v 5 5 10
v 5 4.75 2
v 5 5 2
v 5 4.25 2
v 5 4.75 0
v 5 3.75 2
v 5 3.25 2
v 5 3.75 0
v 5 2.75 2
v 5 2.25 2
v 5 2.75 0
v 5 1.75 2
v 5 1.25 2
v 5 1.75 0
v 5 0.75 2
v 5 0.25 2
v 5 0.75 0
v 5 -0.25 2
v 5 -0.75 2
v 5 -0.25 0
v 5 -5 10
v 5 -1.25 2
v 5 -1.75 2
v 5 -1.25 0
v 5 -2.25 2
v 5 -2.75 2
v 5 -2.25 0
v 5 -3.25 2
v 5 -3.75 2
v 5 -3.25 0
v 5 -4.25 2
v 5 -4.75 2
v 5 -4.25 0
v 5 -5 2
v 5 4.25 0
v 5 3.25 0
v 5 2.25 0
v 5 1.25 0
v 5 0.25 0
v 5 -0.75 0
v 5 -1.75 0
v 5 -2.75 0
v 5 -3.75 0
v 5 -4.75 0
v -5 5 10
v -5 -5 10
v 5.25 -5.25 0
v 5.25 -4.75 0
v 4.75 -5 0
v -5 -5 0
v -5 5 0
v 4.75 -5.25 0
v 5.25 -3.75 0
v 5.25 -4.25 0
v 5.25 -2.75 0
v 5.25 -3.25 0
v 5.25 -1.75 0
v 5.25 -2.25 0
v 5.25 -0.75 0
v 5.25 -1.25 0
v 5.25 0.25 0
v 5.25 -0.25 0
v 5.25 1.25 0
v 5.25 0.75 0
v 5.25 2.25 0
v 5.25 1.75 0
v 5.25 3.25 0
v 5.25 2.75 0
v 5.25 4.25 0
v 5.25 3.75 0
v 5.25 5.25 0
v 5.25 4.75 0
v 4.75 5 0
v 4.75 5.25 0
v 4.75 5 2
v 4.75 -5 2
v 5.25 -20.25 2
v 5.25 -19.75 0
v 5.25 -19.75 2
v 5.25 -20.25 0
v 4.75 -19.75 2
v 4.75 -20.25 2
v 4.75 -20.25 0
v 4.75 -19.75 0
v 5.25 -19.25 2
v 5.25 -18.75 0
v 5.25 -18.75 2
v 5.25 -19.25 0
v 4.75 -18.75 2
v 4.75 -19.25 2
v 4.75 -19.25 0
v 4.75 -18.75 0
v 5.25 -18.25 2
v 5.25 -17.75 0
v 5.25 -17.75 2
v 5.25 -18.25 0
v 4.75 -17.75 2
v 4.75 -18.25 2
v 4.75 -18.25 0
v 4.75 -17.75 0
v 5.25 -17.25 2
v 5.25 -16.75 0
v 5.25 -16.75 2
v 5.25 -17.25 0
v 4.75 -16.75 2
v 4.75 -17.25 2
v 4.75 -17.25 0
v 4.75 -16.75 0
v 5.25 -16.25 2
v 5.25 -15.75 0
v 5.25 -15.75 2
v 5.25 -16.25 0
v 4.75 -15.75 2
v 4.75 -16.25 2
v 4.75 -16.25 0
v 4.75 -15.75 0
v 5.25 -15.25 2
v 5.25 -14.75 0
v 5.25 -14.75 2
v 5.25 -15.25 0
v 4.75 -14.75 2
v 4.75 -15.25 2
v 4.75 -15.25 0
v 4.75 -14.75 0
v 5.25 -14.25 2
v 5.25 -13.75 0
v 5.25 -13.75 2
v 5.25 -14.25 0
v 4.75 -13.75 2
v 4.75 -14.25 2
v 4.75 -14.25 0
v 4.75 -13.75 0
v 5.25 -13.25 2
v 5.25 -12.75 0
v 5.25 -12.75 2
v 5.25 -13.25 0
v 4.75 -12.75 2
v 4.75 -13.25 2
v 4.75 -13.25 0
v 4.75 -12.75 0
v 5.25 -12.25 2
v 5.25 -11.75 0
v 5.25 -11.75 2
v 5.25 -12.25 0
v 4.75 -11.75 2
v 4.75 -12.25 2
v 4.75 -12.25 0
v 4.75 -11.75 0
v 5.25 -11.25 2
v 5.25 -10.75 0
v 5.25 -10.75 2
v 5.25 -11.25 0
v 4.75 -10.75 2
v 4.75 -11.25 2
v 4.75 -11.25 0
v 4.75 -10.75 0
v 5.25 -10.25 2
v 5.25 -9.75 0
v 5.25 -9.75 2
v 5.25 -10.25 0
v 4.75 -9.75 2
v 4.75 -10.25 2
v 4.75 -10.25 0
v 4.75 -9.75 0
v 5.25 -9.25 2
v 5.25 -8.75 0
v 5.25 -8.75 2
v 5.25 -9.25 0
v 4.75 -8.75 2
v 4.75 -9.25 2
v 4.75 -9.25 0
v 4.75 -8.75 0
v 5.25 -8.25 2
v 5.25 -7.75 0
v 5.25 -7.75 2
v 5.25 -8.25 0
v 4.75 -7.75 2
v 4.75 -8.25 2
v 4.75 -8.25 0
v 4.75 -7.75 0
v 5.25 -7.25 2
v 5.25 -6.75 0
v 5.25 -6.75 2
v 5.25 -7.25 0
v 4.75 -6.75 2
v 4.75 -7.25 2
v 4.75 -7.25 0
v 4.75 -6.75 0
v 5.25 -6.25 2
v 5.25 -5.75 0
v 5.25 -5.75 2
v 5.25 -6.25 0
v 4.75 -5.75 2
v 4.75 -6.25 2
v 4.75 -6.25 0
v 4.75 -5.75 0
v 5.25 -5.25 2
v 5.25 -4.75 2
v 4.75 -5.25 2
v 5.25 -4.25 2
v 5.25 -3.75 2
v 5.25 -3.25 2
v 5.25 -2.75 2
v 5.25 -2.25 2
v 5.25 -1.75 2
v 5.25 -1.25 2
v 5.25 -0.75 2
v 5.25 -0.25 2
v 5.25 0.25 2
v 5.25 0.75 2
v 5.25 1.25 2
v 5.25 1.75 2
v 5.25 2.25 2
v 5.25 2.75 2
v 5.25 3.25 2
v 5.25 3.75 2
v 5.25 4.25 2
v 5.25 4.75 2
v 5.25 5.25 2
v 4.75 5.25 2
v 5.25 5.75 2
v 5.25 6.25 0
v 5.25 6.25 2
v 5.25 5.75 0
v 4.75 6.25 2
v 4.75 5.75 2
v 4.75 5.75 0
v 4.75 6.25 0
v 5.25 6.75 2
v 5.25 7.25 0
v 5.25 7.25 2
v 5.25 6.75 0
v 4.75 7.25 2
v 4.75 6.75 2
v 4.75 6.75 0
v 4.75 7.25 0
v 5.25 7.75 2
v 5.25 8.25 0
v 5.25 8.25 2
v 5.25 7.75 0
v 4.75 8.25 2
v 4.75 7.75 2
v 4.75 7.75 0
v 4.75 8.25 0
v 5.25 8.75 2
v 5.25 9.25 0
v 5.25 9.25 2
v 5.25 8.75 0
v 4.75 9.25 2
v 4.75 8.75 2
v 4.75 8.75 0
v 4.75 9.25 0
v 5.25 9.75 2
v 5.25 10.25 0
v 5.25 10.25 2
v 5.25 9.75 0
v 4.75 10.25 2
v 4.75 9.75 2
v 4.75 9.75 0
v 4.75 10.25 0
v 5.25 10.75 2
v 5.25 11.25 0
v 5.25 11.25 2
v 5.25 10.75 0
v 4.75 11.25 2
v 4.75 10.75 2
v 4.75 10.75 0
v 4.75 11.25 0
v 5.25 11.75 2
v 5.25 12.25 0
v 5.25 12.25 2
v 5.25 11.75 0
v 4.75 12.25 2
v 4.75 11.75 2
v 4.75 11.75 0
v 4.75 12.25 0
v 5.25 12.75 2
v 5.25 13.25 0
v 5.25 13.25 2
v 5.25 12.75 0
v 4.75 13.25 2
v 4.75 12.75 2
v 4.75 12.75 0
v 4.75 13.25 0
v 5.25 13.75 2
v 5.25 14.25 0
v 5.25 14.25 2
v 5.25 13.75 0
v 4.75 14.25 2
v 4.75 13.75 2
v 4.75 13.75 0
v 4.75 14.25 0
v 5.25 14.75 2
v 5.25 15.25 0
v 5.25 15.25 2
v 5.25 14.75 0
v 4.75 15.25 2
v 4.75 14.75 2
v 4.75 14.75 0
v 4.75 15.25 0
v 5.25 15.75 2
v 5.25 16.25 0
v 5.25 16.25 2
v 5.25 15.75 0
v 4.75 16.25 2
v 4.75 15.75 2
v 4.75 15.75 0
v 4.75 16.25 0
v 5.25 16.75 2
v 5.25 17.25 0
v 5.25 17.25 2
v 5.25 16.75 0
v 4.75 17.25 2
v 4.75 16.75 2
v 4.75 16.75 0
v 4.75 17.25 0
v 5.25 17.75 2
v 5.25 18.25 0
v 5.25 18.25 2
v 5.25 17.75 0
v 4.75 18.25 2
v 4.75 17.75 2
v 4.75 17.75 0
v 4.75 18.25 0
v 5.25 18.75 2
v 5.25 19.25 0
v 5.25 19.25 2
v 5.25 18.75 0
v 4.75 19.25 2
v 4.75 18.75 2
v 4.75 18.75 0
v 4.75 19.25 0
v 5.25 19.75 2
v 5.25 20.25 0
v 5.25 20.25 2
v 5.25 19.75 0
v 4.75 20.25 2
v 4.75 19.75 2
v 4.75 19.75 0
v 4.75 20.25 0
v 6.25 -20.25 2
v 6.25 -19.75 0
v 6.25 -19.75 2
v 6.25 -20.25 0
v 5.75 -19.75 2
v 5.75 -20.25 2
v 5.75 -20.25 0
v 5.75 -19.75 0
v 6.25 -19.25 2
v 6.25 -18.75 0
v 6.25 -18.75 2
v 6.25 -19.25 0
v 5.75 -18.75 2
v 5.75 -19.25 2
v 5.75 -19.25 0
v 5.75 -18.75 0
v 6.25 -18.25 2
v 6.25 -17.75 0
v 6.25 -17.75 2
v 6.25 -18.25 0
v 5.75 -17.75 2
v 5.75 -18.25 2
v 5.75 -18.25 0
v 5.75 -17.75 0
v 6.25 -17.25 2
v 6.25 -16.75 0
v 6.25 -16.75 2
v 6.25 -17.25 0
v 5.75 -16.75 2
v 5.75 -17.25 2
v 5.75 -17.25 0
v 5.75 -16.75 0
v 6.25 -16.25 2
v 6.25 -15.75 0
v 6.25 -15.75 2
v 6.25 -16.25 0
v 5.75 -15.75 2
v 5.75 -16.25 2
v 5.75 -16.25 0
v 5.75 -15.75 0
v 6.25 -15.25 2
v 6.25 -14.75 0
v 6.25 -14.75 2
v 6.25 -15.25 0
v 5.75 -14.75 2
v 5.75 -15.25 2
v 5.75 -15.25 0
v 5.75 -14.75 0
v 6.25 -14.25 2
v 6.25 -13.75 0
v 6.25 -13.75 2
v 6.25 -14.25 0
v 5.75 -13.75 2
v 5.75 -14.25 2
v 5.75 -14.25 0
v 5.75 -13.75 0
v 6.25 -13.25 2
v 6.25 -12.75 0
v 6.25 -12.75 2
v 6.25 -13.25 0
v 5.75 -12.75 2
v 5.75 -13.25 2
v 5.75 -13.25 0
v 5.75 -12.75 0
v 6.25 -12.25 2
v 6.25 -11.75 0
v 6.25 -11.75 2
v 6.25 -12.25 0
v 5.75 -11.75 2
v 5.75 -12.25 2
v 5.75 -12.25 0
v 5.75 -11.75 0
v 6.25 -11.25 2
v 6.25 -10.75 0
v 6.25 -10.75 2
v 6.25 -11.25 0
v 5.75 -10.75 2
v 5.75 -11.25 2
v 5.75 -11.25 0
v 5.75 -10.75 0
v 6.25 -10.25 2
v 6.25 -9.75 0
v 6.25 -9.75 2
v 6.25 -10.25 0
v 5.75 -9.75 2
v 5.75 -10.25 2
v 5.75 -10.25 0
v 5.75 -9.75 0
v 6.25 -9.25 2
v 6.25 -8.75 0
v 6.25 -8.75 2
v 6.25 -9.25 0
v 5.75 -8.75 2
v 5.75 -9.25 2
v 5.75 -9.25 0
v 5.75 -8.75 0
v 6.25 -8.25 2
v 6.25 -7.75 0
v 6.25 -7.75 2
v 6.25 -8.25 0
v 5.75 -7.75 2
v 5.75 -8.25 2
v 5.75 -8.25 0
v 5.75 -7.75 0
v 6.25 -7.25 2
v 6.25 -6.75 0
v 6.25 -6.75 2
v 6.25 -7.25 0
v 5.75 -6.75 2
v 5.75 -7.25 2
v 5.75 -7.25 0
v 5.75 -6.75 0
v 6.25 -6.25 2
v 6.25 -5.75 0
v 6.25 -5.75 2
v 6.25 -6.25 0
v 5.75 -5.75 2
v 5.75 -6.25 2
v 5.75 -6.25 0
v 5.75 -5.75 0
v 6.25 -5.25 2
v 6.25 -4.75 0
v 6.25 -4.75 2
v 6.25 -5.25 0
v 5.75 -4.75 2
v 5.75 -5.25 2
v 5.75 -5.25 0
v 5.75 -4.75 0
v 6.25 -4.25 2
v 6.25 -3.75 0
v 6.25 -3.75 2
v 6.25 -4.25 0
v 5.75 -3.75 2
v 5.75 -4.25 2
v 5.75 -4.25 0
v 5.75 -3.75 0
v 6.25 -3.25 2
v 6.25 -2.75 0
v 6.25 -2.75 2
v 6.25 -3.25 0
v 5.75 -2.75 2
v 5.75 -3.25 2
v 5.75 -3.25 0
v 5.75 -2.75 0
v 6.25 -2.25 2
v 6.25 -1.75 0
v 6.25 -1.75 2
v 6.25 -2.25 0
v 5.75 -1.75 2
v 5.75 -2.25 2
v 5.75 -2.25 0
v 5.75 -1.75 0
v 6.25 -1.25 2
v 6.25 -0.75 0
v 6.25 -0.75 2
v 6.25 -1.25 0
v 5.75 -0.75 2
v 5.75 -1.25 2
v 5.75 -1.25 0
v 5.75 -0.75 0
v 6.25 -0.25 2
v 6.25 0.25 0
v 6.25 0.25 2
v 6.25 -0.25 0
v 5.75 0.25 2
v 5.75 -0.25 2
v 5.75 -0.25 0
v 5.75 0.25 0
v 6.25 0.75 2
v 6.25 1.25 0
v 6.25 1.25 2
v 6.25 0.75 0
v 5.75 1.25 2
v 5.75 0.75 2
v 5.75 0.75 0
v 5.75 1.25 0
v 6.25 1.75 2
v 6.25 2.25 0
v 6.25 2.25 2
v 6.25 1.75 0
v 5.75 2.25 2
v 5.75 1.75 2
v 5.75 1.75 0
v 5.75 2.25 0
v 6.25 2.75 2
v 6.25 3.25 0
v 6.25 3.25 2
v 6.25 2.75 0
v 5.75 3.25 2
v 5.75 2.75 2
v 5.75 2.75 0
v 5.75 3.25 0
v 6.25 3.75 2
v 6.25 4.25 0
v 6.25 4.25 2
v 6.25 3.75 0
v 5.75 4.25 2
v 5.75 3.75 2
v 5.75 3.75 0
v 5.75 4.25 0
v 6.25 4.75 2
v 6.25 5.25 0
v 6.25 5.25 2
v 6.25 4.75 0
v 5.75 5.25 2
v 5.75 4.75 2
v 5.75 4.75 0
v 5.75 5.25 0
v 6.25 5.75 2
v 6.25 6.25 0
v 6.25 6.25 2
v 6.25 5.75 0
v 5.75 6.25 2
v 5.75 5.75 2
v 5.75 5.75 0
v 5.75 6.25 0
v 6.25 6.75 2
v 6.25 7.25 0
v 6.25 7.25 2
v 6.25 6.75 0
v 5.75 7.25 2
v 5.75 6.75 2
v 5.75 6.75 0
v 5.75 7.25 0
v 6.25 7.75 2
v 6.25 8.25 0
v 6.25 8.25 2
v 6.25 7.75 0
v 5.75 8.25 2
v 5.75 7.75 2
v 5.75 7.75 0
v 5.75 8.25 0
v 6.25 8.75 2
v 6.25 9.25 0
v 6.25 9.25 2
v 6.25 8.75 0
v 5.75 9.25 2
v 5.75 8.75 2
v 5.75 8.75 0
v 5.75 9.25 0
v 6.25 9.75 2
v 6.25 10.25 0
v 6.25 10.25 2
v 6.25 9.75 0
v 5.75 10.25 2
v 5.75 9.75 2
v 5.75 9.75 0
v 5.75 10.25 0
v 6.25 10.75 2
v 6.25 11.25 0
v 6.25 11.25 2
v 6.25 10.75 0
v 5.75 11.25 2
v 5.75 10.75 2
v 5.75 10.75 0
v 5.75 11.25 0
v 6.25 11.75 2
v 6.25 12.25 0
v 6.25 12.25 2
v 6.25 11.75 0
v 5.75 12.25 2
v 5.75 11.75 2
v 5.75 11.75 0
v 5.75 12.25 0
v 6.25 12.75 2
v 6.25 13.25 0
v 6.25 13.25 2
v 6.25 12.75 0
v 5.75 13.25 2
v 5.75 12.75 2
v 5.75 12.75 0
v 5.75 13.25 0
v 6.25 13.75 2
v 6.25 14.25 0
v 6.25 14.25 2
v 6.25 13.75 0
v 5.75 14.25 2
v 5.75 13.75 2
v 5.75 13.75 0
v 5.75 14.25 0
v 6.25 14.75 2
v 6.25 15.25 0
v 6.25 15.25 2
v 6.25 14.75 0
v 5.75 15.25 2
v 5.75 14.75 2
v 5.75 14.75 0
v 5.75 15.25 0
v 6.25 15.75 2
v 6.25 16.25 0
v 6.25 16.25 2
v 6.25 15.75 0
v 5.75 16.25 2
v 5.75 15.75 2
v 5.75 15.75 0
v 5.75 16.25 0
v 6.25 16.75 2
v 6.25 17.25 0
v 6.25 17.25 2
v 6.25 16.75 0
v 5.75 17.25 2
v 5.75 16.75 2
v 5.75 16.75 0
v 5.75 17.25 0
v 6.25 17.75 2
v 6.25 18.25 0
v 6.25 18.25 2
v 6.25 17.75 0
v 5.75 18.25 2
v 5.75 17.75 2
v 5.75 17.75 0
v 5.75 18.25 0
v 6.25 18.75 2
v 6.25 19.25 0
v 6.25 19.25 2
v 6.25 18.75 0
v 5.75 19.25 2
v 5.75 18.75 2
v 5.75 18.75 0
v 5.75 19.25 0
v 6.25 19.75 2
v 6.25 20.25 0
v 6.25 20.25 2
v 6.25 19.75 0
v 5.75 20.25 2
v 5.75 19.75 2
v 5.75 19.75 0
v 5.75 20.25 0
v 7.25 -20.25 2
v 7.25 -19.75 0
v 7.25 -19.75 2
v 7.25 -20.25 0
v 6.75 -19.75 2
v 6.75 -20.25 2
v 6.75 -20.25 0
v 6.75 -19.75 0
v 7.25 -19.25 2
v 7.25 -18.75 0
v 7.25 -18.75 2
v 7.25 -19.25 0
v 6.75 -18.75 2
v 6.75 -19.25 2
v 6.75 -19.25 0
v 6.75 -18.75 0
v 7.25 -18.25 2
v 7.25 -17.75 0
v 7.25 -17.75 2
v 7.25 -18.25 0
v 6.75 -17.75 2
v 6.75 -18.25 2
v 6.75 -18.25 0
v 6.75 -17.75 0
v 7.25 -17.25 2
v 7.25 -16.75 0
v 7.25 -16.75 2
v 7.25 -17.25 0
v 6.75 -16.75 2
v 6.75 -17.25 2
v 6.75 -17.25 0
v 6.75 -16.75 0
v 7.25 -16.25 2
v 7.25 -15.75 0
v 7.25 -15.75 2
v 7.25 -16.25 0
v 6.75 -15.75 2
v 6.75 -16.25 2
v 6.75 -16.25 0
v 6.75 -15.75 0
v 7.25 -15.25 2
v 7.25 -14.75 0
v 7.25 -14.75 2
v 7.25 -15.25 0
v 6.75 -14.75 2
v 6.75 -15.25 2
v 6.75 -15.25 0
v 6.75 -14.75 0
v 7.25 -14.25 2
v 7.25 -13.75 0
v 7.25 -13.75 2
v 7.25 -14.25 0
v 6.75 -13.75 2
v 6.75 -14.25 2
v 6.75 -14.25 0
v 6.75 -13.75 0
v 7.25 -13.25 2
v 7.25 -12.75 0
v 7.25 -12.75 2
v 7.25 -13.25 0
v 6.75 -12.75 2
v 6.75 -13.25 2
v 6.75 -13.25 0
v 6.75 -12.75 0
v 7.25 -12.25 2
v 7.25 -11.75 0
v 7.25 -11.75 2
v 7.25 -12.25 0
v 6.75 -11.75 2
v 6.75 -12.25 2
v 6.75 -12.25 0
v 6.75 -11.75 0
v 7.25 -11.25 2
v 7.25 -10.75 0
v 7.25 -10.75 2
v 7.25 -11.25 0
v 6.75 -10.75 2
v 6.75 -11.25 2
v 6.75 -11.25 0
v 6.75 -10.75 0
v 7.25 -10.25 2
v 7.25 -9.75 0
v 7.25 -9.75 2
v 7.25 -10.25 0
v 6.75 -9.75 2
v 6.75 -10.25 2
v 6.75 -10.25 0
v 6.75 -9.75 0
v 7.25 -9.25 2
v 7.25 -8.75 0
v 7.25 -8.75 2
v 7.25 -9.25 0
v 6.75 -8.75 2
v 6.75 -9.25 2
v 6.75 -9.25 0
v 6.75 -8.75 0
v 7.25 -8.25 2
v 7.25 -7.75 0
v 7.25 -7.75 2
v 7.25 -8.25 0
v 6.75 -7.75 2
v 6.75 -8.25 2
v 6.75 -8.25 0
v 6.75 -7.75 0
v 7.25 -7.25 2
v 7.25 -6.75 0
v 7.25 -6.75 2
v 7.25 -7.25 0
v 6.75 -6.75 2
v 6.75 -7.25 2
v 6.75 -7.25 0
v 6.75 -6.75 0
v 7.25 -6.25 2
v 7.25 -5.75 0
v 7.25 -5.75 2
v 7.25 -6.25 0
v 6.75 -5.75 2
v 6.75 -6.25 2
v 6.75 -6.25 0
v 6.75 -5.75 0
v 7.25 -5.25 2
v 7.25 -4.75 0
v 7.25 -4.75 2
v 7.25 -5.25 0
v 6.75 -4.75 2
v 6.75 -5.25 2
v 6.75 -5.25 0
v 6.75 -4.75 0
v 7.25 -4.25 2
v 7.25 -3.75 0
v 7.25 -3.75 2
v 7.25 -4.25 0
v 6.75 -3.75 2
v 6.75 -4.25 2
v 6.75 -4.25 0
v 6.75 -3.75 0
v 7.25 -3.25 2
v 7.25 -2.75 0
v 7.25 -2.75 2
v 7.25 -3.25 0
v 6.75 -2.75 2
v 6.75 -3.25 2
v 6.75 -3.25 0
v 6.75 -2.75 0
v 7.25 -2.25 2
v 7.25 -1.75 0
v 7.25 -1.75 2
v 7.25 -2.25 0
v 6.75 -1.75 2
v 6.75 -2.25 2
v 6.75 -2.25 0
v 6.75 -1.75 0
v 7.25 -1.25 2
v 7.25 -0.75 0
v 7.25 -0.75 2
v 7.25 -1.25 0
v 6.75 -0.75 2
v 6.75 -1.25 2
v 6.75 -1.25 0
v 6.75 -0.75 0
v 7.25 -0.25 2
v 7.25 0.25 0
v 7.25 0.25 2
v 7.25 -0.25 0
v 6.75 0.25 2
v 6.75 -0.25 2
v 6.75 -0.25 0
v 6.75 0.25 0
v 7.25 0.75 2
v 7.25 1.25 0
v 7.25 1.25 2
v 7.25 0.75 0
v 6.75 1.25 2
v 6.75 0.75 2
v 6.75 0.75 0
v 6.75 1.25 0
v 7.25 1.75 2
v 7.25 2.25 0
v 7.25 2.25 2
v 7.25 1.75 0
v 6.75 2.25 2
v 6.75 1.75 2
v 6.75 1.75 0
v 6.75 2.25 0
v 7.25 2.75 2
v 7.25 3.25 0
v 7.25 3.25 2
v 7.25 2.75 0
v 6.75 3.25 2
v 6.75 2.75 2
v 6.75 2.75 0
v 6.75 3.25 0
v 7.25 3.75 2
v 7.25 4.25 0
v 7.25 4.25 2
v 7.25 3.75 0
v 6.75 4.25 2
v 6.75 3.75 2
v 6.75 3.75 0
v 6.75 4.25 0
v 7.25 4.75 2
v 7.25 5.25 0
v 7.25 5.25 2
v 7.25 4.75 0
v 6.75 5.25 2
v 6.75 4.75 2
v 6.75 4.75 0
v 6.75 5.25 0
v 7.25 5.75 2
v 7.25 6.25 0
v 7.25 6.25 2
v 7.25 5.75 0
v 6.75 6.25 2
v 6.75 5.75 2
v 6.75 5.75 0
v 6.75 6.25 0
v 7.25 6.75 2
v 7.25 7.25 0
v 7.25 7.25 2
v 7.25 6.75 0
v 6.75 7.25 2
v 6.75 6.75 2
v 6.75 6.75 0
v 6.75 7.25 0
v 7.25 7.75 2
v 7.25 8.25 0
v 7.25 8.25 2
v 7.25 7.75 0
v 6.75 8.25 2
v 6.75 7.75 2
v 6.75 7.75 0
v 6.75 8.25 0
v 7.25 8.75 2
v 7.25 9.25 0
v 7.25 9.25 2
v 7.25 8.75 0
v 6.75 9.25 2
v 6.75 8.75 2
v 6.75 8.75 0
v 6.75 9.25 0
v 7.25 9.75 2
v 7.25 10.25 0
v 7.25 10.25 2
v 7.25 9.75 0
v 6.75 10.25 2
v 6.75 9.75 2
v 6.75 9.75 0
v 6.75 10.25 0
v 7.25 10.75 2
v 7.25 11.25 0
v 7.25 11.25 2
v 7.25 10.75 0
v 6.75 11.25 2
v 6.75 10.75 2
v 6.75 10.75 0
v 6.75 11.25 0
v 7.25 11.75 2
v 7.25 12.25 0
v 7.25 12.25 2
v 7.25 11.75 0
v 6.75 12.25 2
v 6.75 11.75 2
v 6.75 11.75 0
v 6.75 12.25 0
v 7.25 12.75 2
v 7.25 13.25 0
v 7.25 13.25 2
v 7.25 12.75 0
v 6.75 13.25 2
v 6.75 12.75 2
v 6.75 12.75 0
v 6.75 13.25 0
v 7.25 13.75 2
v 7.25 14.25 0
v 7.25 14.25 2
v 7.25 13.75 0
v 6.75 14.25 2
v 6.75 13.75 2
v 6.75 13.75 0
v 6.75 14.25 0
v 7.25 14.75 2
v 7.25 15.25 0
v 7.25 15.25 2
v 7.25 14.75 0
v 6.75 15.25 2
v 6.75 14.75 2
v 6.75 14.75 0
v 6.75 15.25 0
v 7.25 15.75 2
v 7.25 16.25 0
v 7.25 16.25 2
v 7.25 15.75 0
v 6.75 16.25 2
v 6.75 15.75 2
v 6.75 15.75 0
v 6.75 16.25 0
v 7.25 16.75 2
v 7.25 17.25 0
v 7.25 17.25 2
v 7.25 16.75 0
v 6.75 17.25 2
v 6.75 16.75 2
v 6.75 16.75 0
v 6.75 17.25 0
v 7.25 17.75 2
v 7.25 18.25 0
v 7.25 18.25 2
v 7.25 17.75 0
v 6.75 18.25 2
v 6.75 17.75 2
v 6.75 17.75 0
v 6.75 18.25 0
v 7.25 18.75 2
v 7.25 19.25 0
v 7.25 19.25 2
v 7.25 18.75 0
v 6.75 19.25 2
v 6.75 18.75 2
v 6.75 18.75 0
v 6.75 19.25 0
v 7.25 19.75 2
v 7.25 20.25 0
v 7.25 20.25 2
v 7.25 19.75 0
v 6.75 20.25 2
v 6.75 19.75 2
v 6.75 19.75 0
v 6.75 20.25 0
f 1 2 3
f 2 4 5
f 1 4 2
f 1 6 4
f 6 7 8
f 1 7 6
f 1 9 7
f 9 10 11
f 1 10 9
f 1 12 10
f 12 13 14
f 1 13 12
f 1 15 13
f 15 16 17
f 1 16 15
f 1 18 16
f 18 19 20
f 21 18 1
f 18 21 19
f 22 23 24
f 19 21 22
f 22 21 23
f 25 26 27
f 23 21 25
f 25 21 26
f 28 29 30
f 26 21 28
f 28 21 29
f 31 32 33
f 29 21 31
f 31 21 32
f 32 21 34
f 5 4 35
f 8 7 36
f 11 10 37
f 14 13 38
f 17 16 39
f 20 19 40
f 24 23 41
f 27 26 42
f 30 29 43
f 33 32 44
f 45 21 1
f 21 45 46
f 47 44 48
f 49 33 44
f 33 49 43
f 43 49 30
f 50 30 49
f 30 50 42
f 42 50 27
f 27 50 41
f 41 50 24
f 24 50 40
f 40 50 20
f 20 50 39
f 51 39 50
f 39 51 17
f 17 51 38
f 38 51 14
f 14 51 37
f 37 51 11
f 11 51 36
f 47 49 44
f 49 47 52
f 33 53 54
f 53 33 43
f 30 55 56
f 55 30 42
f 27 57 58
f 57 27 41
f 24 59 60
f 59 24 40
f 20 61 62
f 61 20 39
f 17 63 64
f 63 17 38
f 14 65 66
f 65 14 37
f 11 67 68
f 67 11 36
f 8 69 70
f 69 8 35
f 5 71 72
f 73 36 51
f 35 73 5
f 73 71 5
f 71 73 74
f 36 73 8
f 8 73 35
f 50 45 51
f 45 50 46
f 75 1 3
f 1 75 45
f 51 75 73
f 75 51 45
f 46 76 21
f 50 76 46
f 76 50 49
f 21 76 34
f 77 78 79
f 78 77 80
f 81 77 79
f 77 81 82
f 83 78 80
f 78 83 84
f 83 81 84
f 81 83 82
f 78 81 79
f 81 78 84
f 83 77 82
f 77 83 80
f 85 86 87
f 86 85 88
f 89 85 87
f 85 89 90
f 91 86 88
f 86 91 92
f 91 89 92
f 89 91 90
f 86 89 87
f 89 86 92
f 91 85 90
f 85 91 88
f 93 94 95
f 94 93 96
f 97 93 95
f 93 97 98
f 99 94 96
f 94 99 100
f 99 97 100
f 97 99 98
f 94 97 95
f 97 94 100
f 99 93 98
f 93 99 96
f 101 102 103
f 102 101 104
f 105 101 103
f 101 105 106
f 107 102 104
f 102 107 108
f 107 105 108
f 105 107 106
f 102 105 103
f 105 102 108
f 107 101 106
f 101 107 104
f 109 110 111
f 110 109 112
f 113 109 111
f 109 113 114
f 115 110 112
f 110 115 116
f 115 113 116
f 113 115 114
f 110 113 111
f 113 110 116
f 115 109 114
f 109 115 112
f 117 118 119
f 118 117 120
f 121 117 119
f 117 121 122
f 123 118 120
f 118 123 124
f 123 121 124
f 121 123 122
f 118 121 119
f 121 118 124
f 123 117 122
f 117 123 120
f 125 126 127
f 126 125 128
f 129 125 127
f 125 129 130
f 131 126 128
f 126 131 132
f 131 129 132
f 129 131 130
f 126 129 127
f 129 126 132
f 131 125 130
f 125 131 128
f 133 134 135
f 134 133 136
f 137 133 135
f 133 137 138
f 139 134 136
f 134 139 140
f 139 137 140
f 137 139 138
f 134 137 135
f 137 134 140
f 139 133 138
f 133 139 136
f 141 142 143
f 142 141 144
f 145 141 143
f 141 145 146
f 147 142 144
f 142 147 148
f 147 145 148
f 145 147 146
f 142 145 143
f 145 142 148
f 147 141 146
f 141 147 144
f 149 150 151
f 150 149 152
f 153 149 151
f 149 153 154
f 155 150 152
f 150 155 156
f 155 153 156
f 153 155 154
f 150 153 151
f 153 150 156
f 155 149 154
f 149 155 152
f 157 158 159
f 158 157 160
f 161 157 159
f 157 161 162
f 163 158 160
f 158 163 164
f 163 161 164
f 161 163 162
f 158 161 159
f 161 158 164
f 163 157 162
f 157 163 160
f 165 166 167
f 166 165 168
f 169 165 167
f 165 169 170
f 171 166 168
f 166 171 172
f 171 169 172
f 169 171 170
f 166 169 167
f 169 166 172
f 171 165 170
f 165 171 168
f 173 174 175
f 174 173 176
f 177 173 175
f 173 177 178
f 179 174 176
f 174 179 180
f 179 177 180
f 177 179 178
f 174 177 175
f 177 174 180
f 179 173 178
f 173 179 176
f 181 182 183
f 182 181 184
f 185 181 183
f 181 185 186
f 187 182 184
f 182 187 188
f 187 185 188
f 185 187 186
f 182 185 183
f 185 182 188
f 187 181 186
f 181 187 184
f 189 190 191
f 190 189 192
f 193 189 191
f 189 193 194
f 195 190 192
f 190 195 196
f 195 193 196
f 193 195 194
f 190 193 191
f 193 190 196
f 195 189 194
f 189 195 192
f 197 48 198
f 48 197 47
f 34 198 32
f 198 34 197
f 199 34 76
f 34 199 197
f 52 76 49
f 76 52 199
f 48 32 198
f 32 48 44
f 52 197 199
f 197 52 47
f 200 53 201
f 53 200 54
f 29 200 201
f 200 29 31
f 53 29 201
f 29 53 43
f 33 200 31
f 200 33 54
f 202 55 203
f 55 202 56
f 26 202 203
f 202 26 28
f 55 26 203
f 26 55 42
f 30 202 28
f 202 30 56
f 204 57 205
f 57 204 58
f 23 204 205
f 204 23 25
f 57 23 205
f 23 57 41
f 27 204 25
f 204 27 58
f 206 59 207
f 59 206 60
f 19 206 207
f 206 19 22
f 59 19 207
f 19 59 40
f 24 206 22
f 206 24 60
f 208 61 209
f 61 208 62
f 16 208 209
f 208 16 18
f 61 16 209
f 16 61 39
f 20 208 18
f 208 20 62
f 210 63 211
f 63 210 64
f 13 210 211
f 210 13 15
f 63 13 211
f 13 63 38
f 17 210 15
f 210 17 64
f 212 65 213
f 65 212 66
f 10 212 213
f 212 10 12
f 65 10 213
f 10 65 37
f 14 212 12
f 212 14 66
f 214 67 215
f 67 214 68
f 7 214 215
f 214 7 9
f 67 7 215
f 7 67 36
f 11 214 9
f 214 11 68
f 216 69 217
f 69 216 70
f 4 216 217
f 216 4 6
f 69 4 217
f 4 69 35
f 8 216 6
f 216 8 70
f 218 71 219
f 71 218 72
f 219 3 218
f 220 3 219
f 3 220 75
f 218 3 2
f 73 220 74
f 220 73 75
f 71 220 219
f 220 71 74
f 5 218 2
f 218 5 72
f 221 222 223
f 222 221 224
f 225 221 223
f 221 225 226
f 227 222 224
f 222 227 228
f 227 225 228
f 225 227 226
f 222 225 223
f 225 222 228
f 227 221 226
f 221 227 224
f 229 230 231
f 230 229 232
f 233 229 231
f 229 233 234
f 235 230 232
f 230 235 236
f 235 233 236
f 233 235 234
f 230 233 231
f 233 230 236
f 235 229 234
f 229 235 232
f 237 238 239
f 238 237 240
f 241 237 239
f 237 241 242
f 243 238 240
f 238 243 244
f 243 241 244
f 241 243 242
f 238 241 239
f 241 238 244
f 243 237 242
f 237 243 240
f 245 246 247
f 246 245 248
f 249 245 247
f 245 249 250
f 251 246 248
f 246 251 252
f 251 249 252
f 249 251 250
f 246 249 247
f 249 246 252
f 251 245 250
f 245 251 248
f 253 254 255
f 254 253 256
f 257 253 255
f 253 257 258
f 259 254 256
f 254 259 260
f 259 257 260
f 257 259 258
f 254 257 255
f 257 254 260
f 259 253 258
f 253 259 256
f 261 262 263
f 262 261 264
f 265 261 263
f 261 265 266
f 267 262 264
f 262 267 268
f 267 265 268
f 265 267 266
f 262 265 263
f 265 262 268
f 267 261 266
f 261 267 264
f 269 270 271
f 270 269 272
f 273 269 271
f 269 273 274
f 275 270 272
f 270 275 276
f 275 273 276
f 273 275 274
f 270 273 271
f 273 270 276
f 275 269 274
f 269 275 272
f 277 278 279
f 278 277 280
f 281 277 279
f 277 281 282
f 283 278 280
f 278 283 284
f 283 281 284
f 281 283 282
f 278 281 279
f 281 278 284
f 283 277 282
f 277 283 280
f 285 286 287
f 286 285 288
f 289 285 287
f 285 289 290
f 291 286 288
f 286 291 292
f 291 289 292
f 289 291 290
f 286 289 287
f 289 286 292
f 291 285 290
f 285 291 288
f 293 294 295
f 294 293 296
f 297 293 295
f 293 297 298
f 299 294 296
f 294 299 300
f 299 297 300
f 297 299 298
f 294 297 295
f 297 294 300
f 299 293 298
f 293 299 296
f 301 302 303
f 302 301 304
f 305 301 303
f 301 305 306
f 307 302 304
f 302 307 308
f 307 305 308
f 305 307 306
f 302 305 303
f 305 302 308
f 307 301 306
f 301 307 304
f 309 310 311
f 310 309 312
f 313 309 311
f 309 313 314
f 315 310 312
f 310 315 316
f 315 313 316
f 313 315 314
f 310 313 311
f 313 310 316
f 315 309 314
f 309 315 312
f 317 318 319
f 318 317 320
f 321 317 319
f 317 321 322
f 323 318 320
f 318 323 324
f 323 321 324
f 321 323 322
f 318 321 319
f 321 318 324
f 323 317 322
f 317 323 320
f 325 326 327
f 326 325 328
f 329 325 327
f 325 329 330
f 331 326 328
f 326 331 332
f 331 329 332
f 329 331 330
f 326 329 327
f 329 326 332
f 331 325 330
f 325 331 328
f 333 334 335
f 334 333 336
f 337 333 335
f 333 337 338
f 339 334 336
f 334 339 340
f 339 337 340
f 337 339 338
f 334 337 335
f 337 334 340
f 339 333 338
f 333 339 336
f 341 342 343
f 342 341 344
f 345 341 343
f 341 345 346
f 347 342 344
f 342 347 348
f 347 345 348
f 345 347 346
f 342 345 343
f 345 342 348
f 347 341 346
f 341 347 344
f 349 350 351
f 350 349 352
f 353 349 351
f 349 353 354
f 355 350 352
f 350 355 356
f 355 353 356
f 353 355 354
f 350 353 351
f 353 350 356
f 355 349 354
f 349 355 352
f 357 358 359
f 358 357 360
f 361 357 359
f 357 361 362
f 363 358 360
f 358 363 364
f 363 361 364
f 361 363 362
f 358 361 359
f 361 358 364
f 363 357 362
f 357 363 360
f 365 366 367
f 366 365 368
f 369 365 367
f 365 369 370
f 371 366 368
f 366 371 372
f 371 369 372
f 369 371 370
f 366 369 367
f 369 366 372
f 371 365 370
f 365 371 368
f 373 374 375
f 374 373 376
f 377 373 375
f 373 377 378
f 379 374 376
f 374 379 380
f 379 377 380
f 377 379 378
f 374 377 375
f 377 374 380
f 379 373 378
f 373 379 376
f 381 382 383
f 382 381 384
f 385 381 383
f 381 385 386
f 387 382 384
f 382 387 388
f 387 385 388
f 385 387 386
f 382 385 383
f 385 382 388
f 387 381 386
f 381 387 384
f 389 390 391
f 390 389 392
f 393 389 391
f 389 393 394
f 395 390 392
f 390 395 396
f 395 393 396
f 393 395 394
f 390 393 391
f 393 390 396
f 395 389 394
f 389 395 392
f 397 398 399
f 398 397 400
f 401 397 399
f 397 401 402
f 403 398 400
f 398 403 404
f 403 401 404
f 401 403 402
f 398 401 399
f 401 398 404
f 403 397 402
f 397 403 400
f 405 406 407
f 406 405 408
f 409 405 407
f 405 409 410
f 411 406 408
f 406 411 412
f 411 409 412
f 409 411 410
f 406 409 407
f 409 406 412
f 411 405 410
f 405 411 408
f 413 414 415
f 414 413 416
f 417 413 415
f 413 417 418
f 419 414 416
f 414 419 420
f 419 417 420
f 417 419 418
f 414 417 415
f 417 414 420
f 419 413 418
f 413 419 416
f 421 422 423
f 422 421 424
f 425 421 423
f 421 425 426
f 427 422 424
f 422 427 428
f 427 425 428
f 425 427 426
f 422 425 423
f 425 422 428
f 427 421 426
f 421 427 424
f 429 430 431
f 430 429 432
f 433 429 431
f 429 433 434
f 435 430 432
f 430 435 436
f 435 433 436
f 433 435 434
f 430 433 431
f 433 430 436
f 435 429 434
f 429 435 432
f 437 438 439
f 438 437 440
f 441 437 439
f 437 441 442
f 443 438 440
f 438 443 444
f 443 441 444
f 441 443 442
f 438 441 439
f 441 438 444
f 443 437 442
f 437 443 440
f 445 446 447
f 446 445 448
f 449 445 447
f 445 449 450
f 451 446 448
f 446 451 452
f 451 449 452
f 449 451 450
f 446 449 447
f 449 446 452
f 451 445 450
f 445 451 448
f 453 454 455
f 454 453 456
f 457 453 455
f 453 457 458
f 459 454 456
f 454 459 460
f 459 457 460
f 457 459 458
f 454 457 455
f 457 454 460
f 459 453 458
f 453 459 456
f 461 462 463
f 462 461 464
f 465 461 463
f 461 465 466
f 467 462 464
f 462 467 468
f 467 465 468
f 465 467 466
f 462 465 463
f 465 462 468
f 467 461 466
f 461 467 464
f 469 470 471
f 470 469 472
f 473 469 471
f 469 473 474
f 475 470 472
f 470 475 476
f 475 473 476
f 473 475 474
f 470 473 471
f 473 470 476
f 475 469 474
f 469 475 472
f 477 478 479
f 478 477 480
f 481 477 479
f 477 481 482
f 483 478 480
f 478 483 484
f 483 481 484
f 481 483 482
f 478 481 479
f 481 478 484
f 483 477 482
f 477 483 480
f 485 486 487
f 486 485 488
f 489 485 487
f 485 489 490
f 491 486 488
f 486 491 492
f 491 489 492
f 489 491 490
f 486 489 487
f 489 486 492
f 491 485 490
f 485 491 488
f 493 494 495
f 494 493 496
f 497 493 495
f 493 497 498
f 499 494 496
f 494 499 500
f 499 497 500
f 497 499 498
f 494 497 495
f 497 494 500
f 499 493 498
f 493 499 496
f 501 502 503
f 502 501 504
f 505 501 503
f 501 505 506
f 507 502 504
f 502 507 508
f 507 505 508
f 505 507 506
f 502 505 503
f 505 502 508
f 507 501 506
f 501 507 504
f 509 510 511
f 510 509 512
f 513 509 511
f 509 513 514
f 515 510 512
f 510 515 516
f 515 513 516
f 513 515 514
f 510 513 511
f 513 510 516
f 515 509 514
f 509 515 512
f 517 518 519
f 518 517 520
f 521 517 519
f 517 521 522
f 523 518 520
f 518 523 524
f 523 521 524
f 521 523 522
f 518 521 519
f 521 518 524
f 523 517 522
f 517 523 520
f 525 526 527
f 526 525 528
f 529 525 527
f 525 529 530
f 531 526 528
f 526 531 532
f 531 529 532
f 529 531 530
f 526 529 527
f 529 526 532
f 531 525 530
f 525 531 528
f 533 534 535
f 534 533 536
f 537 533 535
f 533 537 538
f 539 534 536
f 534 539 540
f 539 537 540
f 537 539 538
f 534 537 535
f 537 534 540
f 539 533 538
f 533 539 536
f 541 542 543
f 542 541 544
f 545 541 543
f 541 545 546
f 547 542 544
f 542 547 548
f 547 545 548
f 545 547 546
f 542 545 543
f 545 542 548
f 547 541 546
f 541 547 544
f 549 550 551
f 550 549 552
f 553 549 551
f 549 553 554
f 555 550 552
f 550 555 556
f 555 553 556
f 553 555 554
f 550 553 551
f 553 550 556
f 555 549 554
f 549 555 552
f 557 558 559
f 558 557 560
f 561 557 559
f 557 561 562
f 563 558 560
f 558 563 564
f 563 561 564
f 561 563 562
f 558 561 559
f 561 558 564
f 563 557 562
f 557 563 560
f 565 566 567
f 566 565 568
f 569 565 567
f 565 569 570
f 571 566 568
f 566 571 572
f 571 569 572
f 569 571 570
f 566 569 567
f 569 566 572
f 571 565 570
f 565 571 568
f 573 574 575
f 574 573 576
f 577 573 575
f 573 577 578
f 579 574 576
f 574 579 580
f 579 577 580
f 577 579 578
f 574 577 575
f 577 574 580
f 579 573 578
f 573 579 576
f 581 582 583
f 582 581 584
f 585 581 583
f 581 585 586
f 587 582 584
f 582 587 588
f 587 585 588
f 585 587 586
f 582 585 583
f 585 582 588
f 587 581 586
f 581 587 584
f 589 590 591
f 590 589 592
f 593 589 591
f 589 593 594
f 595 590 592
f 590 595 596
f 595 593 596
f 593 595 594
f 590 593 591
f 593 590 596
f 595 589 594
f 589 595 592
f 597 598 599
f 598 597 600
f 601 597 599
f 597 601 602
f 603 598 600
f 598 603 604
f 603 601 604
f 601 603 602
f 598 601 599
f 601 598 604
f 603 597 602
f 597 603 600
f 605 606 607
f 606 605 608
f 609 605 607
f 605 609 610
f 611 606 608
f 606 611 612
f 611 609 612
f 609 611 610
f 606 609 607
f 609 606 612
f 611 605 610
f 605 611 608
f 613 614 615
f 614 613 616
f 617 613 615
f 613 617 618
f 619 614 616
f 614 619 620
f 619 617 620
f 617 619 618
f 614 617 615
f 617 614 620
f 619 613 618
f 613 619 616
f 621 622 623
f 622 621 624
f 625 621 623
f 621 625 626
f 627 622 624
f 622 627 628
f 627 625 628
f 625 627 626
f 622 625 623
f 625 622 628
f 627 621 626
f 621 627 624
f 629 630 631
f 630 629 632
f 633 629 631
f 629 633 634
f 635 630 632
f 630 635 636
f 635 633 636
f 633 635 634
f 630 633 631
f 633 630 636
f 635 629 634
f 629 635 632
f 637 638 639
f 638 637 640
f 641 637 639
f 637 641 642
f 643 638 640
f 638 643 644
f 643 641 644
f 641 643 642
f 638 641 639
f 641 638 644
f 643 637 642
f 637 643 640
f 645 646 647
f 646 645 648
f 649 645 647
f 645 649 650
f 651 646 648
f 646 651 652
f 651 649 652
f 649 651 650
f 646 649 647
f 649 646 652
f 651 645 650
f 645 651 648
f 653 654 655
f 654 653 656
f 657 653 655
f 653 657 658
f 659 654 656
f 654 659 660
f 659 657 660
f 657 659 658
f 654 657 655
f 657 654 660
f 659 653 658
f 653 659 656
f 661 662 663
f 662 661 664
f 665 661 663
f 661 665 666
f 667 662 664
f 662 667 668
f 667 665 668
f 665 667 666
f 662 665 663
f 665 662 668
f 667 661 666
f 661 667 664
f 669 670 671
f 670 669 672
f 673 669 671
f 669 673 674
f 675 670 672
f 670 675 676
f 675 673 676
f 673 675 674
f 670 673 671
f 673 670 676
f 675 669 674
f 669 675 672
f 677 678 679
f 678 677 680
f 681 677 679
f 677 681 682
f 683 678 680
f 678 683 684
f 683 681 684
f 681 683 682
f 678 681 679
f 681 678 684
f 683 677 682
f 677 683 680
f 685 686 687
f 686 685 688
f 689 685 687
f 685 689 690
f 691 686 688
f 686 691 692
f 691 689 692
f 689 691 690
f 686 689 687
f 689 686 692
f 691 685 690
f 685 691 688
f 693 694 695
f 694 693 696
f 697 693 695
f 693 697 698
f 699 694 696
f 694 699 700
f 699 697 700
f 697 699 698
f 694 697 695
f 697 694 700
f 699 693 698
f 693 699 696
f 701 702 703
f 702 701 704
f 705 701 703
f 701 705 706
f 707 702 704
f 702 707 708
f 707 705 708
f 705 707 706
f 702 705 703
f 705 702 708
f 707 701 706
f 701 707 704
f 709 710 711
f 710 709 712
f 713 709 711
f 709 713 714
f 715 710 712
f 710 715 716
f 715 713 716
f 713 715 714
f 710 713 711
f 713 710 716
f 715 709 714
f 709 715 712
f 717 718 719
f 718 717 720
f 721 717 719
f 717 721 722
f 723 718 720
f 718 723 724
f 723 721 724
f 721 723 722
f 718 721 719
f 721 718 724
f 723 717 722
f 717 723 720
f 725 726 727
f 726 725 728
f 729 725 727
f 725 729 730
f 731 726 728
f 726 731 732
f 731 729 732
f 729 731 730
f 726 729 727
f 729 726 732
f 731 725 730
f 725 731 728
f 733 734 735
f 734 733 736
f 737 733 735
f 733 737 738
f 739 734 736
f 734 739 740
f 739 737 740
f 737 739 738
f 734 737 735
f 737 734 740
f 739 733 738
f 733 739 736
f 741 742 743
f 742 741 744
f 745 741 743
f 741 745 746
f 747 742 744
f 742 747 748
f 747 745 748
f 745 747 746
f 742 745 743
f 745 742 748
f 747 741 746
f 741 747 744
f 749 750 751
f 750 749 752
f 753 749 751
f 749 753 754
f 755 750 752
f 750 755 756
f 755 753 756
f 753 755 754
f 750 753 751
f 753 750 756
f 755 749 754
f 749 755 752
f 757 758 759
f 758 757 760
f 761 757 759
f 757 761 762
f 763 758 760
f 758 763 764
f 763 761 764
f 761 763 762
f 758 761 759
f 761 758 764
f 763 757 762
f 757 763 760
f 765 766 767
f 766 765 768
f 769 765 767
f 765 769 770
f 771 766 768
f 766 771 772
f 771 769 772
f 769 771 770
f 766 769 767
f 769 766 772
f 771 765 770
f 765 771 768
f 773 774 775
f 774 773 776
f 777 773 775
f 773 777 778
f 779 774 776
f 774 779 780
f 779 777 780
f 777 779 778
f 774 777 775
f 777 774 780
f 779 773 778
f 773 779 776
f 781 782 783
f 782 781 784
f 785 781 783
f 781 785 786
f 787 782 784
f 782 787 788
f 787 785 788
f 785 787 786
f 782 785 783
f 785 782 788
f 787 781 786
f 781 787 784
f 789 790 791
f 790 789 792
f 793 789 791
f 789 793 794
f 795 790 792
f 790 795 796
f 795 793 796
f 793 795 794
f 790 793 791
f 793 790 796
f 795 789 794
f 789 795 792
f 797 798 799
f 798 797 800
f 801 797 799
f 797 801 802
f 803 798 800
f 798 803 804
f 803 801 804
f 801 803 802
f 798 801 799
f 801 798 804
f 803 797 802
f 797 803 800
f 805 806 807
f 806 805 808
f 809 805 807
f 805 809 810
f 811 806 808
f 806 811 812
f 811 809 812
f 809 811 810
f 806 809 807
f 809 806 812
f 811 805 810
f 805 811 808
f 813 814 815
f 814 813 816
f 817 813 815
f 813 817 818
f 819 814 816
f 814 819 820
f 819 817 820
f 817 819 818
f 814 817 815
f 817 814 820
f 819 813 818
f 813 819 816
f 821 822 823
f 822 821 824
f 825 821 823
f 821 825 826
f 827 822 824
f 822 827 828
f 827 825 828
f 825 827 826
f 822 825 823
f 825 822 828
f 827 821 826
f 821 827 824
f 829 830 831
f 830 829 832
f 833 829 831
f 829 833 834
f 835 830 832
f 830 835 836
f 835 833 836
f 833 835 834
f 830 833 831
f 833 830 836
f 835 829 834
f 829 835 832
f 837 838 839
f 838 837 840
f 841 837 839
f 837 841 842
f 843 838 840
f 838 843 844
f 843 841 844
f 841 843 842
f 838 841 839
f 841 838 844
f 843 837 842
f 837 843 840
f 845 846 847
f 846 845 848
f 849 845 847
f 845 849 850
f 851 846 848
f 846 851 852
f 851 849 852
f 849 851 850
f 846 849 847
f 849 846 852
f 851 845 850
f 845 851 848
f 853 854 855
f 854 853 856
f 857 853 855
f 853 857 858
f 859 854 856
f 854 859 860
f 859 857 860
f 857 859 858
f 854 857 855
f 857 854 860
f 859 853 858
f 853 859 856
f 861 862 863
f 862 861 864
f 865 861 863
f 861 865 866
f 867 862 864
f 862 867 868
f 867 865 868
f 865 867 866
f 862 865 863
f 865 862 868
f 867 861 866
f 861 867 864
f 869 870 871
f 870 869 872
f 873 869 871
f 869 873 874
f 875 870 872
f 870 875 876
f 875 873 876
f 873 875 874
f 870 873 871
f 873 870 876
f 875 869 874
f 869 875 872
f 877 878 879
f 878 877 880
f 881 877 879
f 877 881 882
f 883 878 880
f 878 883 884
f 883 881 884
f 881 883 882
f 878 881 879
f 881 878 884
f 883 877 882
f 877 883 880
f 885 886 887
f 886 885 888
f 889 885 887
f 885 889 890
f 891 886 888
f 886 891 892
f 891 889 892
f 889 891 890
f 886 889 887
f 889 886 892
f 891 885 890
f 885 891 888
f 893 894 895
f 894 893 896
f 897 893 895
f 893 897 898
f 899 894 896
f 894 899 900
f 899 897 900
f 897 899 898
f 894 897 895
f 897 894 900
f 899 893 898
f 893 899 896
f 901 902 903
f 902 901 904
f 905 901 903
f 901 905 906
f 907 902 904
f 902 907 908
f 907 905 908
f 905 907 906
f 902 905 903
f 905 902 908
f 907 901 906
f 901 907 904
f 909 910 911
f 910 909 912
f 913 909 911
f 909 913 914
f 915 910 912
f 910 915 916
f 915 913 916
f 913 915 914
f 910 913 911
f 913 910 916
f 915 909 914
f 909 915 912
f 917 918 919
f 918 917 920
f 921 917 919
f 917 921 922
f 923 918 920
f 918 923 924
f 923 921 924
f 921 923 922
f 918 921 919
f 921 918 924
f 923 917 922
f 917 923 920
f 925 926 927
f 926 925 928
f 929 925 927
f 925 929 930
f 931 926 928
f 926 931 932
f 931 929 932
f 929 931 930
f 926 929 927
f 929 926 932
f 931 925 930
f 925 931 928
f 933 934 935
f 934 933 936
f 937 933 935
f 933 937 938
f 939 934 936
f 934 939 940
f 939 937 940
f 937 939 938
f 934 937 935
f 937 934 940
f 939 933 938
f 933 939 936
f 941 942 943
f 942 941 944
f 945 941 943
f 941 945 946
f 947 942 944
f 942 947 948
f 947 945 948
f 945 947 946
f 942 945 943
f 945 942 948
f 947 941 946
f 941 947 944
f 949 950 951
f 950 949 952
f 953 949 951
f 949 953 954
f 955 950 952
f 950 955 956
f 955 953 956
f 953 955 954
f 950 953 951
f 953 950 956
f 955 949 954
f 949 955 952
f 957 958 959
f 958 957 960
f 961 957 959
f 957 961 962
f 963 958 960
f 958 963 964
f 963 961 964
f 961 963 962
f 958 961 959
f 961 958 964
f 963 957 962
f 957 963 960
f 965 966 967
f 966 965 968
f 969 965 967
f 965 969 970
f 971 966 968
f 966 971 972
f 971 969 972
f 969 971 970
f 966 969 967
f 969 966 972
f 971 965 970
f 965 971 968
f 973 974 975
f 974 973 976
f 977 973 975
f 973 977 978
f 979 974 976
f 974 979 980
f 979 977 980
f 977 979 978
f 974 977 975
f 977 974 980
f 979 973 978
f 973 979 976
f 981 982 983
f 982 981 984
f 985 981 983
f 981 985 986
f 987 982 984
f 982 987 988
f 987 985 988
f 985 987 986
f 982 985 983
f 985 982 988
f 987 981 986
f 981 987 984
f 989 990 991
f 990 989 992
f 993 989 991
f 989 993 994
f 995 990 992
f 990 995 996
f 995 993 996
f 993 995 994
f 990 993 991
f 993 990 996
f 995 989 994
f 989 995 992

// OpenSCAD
translate([0, 0, 5]) color([0,1,0,0.9]) cube([10, 10, 10], center=true);
translate([5.0, -20.0, 1]) color([1,0,0]) cube([0.5, 0.5, 2], center=true);
translate([5.0, -19.0, 1]) color([1,0,0]) cube([0.5, 0.5, 2], center=true);
translate([5.0, -18.0, 1]) color([1,0,0]) cube([0.5, 0.5, 2], center=true);
translate([5.0, -17.0, 1]) color([1,0,0]) cube([0.5, 0.5, 2], center=true);
translate([5.0, -16.0, 1]) color([1,0,0]) cube([0.5, 0.5, 2], center=true);
translate([5.0, -15.0, 1]) color([1,0,0]) cube([0.5, 0.5, 2], center=true);
translate([5.0, -14.0, 1]) color([1,0,0]) cube([0.5, 0.5, 2], center=true);
translate([5.0, -13.0, 1]) color([1,0,0]) cube([0.5, 0.5, 2], center=true);
translate([5.0, -12.0, 1]) color([1,0,0]) cube([0.5, 0.5, 2], center=true);
translate([5.0, -11.0, 1]) color([1,0,0]) cube([0.5, 0.5, 2], center=true);
translate([5.0, -10.0, 1]) color([1,0,0]) cube([0.5, 0.5, 2], center=true);
translate([5.0, -9.0, 1]) color([1,0,0]) cube([0.5, 0.5, 2], center=true);
translate([5.0, -8.0, 1]) color([1,0,0]) cube([0.5, 0.5, 2], center=true);
translate([5.0, -7.0, 1]) color([1,0,0]) cube([0.5, 0.5, 2], center=true);
translate([5.0, -6.0, 1]) color([1,0,0]) cube([0.5, 0.5, 2], center=true);
translate([5.0, -5.0, 1]) color([1,0,0]) cube([0.5, 0.5, 2], center=true);
translate([5.0, -4.0, 1]) color([1,0,0]) cube([0.5, 0.5, 2], center=true);
translate([5.0, -3.0, 1]) color([1,0,0]) cube([0.5, 0.5, 2], center=true);
translate([5.0, -2.0, 1]) color([1,0,0]) cube([0.5, 0.5, 2], center=true);
translate([5.0, -1.0, 1]) color([1,0,0]) cube([0.5, 0.5, 2], center=true);
translate([5.0, 0.0, 1]) color([1,0,0]) cube([0.5, 0.5, 2], center=true);
translate([5.0, 1.0, 1]) color([1,0,0]) cube([0.5, 0.5, 2], center=true);
translate([5.0, 2.0, 1]) color([1,0,0]) cube([0.5, 0.5, 2], center=true);
translate([5.0, 3.0, 1]) color([1,0,0]) cube([0.5, 0.5, 2], center=true);
translate([5.0, 4.0, 1]) color([1,0,0]) cube([0.5, 0.5, 2], center=true);
translate([5.0, 5.0, 1]) color([1,0,0]) cube([0.5, 0.5, 2], center=true);
translate([5.0, 6.0, 1]) color([1,0,0]) cube([0.5, 0.5, 2], center=true);
translate([5.0, 7.0, 1]) color([1,0,0]) cube([0.5, 0.5, 2], center=true);
translate([5.0, 8.0, 1]) color([1,0,0]) cube([0.5, 0.5, 2], center=true);
translate([5.0, 9.0, 1]) color([1,0,0]) cube([0.5, 0.5, 2], center=true);
translate([5.0, 10.0, 1]) color([1,0,0]) cube([0.5, 0.5, 2], center=true);
translate([5.0, 11.0, 1]) color([1,0,0]) cube([0.5, 0.5, 2], center=true);
translate([5.0, 12.0, 1]) color([1,0,0]) cube([0.5, 0.5, 2], center=true);
translate([5.0, 13.0, 1]) color([1,0,0]) cube([0.5, 0.5, 2], center=true);
translate([5.0, 14.0, 1]) color([1,0,0]) cube([0.5, 0.5, 2], center=true);
translate([5.0, 15.0, 1]) color([1,0,0]) cube([0.5, 0.5, 2], center=true);
translate([5.0, 16.0, 1]) color([1,0,0]) cube([0.5, 0.5, 2], center=true);
translate([5.0, 17.0, 1]) color([1,0,0]) cube([0.5, 0.5, 2], center=true);
translate([5.0, 18.0, 1]) color([1,0,0]) cube([0.5, 0.5, 2], center=true);
translate([5.0, 19.0, 1]) color([1,0,0]) cube([0.5, 0.5, 2], center=true);
translate([5.0, 20.0, 1]) color([1,0,0]) cube([0.5, 0.5, 2], center=true);
translate([6.0, -20.0, 1]) color([1,0,0]) cube([0.5, 0.5, 2], center=true);
translate([6.0, -19.0, 1]) color([1,0,0]) cube([0.5, 0.5, 2], center=true);
translate([6.0, -18.0, 1]) color([1,0,0]) cube([0.5, 0.5, 2], center=true);
translate([6.0, -17.0, 1]) color([1,0,0]) cube([0.5, 0.5, 2], center=true);
translate([6.0, -16.0, 1]) color([1,0,0]) cube([0.5, 0.5, 2], center=true);
translate([6.0, -15.0, 1]) color([1,0,0]) cube([0.5, 0.5, 2], center=true);
translate([6.0, -14.0, 1]) color([1,0,0]) cube([0.5, 0.5, 2], center=true);
translate([6.0, -13.0, 1]) color([1,0,0]) cube([0.5, 0.5, 2], center=true);
translate([6.0, -12.0, 1]) color([1,0,0]) cube([0.5, 0.5, 2], center=true);
translate([6.0, -11.0, 1]) color([1,0,0]) cube([0.5, 0.5, 2], center=true);
translate([6.0, -10.0, 1]) color([1,0,0]) cube([0.5, 0.5, 2], center=true);
translate([6.0, -9.0, 1]) color([1,0,0]) cube([0.5, 0.5, 2], center=true);
translate([6.0, -8.0, 1]) color([1,0,0]) cube([0.5, 0.5, 2], center=true);
translate([6.0, -7.0, 1]) color([1,0,0]) cube([0.5, 0.5, 2], center=true);
translate([6.0, -6.0, 1]) color([1,0,0]) cube([0.5, 0.5, 2], center=true);
translate([6.0, -5.0, 1]) color([1,0,0]) cube([0.5, 0.5, 2], center=true);
translate([6.0, -4.0, 1]) color([1,0,0]) cube([0.5, 0.5, 2], center=true);
translate([6.0, -3.0, 1]) color([1,0,0]) cube([0.5, 0.5, 2], center=true);
translate([6.0, -2.0, 1]) color([1,0,0]) cube([0.5, 0.5, 2], center=true);
translate([6.0, -1.0, 1]) color([1,0,0]) cube([0.5, 0.5, 2], center=true);
translate([6.0, 0.0, 1]) color([1,0,0]) cube([0.5, 0.5, 2], center=true);
translate([6.0, 1.0, 1]) color([1,0,0]) cube([0.5, 0.5, 2], center=true);
translate([6.0, 2.0, 1]) color([1,0,0]) cube([0.5, 0.5, 2], center=true);
translate([6.0, 3.0, 1]) color([1,0,0]) cube([0.5, 0.5, 2], center=true);
translate([6.0, 4.0, 1]) color([1,0,0]) cube([0.5, 0.5, 2], center=true);
translate([6.0, 5.0, 1]) color([1,0,0]) cube([0.5, 0.5, 2], center=true);
translate([6.0, 6.0, 1]) color([1,0,0]) cube([0.5, 0.5, 2], center=true);
translate([6.0, 7.0, 1]) color([1,0,0]) cube([0.5, 0.5, 2], center=true);
translate([6.0, 8.0, 1]) color([1,0,0]) cube([0.5, 0.5, 2], center=true);
translate([6.0, 9.0, 1]) color([1,0,0]) cube([0.5, 0.5, 2], center=true);
translate([6.0, 10.0, 1]) color([1,0,0]) cube([0.5, 0.5, 2], center=true);
translate([6.0, 11.0, 1]) color([1,0,0]) cube([0.5, 0.5, 2], center=true);
translate([6.0, 12.0, 1]) color([1,0,0]) cube([0.5, 0.5, 2], center=true);
translate([6.0, 13.0, 1]) color([1,0,0]) cube([0.5, 0.5, 2], center=true);
translate([6.0, 14.0, 1]) color([1,0,0]) cube([0.5, 0.5, 2], center=true);
translate([6.0, 15.0, 1]) color([1,0,0]) cube([0.5, 0.5, 2], center=true);
translate([6.0, 16.0, 1]) color([1,0,0]) cube([0.5, 0.5, 2], center=true);
translate([6.0, 17.0, 1]) color([1,0,0]) cube([0.5, 0.5, 2], center=true);
translate([6.0, 18.0, 1]) color([1,0,0]) cube([0.5, 0.5, 2], center=true);
translate([6.0, 19.0, 1]) color([1,0,0]) cube([0.5, 0.5, 2], center=true);
translate([6.0, 20.0, 1]) color([1,0,0]) cube([0.5, 0.5, 2], center=true);
translate([7.0, -20.0, 1]) color([1,0,0]) cube([0.5, 0.5, 2], center=true);
translate([7.0, -19.0, 1]) color([1,0,0]) cube([0.5, 0.5, 2], center=true);
translate([7.0, -18.0, 1]) color([1,0,0]) cube([0.5, 0.5, 2], center=true);
translate([7.0, -17.0, 1]) color([1,0,0]) cube([0.5, 0.5, 2], center=true);
translate([7.0, -16.0, 1]) color([1,0,0]) cube([0.5, 0.5, 2], center=true);
translate([7.0, -15.0, 1]) color([1,0,0]) cube([0.5, 0.5, 2], center=true);
translate([7.0, -14.0, 1]) color([1,0,0]) cube([0.5, 0.5, 2], center=true);
translate([7.0, -13.0, 1]) color([1,0,0]) cube([0.5, 0.5, 2], center=true);
translate([7.0, -12.0, 1]) color([1,0,0]) cube([0.5, 0.5, 2], center=true);
translate([7.0, -11.0, 1]) color([1,0,0]) cube([0.5, 0.5, 2], center=true);
translate([7.0, -10.0, 1]) color([1,0,0]) cube([0.5, 0.5, 2], center=true);
translate([7.0, -9.0, 1]) color([1,0,0]) cube([0.5, 0.5, 2], center=true);
translate([7.0, -8.0, 1]) color([1,0,0]) cube([0.5, 0.5, 2], center=true);
translate([7.0, -7.0, 1]) color([1,0,0]) cube([0.5, 0.5, 2], center=true);
translate([7.0, -6.0, 1]) color([1,0,0]) cube([0.5, 0.5, 2], center=true);
translate([7.0, -5.0, 1]) color([1,0,0]) cube([0.5, 0.5, 2], center=true);
translate([7.0, -4.0, 1]) color([1,0,0]) cube([0.5, 0.5, 2], center=true);
translate([7.0, -3.0, 1]) color([1,0,0]) cube([0.5, 0.5, 2], center=true);
translate([7.0, -2.0, 1]) color([1,0,0]) cube([0.5, 0.5, 2], center=true);
translate([7.0, -1.0, 1]) color([1,0,0]) cube([0.5, 0.5, 2], center=true);
translate([7.0, 0.0, 1]) color([1,0,0]) cube([0.5, 0.5, 2], center=true);
translate([7.0, 1.0, 1]) color([1,0,0]) cube([0.5, 0.5, 2], center=true);
translate([7.0, 2.0, 1]) color([1,0,0]) cube([0.5, 0.5, 2], center=true);
translate([7.0, 3.0, 1]) color([1,0,0]) cube([0.5, 0.5, 2], center=true);
translate([7.0, 4.0, 1]) color([1,0,0]) cube([0.5, 0.5, 2], center=true);
translate([7.0, 5.0, 1]) color([1,0,0]) cube([0.5, 0.5, 2], center=true);
translate([7.0, 6.0, 1]) color([1,0,0]) cube([0.5, 0.5, 2], center=true);
translate([7.0, 7.0, 1]) color([1,0,0]) cube([0.5, 0.5, 2], center=true);
translate([7.0, 8.0, 1]) color([1,0,0]) cube([0.5, 0.5, 2], center=true);
translate([7.0, 9.0, 1]) color([1,0,0]) cube([0.5, 0.5, 2], center=true);
translate([7.0, 10.0, 1]) color([1,0,0]) cube([0.5, 0.5, 2], center=true);
translate([7.0, 11.0, 1]) color([1,0,0]) cube([0.5, 0.5, 2], center=true);
translate([7.0, 12.0, 1]) color([1,0,0]) cube([0.5, 0.5, 2], center=true);
translate([7.0, 13.0, 1]) color([1,0,0]) cube([0.5, 0.5, 2], center=true);
translate([7.0, 14.0, 1]) color([1,0,0]) cube([0.5, 0.5, 2], center=true);
translate([7.0, 15.0, 1]) color([1,0,0]) cube([0.5, 0.5, 2], center=true);
translate([7.0, 16.0, 1]) color([1,0,0]) cube([0.5, 0.5, 2], center=true);
translate([7.0, 17.0, 1]) color([1,0,0]) cube([0.5, 0.5, 2], center=true);
translate([7.0, 18.0, 1]) color([1,0,0]) cube([0.5, 0.5, 2], center=true);
translate([7.0, 19.0, 1]) color([1,0,0]) cube([0.5, 0.5, 2], center=true);
translate([7.0, 20.0, 1]) color([1,0,0]) cube([0.5, 0.5, 2], center=true);
